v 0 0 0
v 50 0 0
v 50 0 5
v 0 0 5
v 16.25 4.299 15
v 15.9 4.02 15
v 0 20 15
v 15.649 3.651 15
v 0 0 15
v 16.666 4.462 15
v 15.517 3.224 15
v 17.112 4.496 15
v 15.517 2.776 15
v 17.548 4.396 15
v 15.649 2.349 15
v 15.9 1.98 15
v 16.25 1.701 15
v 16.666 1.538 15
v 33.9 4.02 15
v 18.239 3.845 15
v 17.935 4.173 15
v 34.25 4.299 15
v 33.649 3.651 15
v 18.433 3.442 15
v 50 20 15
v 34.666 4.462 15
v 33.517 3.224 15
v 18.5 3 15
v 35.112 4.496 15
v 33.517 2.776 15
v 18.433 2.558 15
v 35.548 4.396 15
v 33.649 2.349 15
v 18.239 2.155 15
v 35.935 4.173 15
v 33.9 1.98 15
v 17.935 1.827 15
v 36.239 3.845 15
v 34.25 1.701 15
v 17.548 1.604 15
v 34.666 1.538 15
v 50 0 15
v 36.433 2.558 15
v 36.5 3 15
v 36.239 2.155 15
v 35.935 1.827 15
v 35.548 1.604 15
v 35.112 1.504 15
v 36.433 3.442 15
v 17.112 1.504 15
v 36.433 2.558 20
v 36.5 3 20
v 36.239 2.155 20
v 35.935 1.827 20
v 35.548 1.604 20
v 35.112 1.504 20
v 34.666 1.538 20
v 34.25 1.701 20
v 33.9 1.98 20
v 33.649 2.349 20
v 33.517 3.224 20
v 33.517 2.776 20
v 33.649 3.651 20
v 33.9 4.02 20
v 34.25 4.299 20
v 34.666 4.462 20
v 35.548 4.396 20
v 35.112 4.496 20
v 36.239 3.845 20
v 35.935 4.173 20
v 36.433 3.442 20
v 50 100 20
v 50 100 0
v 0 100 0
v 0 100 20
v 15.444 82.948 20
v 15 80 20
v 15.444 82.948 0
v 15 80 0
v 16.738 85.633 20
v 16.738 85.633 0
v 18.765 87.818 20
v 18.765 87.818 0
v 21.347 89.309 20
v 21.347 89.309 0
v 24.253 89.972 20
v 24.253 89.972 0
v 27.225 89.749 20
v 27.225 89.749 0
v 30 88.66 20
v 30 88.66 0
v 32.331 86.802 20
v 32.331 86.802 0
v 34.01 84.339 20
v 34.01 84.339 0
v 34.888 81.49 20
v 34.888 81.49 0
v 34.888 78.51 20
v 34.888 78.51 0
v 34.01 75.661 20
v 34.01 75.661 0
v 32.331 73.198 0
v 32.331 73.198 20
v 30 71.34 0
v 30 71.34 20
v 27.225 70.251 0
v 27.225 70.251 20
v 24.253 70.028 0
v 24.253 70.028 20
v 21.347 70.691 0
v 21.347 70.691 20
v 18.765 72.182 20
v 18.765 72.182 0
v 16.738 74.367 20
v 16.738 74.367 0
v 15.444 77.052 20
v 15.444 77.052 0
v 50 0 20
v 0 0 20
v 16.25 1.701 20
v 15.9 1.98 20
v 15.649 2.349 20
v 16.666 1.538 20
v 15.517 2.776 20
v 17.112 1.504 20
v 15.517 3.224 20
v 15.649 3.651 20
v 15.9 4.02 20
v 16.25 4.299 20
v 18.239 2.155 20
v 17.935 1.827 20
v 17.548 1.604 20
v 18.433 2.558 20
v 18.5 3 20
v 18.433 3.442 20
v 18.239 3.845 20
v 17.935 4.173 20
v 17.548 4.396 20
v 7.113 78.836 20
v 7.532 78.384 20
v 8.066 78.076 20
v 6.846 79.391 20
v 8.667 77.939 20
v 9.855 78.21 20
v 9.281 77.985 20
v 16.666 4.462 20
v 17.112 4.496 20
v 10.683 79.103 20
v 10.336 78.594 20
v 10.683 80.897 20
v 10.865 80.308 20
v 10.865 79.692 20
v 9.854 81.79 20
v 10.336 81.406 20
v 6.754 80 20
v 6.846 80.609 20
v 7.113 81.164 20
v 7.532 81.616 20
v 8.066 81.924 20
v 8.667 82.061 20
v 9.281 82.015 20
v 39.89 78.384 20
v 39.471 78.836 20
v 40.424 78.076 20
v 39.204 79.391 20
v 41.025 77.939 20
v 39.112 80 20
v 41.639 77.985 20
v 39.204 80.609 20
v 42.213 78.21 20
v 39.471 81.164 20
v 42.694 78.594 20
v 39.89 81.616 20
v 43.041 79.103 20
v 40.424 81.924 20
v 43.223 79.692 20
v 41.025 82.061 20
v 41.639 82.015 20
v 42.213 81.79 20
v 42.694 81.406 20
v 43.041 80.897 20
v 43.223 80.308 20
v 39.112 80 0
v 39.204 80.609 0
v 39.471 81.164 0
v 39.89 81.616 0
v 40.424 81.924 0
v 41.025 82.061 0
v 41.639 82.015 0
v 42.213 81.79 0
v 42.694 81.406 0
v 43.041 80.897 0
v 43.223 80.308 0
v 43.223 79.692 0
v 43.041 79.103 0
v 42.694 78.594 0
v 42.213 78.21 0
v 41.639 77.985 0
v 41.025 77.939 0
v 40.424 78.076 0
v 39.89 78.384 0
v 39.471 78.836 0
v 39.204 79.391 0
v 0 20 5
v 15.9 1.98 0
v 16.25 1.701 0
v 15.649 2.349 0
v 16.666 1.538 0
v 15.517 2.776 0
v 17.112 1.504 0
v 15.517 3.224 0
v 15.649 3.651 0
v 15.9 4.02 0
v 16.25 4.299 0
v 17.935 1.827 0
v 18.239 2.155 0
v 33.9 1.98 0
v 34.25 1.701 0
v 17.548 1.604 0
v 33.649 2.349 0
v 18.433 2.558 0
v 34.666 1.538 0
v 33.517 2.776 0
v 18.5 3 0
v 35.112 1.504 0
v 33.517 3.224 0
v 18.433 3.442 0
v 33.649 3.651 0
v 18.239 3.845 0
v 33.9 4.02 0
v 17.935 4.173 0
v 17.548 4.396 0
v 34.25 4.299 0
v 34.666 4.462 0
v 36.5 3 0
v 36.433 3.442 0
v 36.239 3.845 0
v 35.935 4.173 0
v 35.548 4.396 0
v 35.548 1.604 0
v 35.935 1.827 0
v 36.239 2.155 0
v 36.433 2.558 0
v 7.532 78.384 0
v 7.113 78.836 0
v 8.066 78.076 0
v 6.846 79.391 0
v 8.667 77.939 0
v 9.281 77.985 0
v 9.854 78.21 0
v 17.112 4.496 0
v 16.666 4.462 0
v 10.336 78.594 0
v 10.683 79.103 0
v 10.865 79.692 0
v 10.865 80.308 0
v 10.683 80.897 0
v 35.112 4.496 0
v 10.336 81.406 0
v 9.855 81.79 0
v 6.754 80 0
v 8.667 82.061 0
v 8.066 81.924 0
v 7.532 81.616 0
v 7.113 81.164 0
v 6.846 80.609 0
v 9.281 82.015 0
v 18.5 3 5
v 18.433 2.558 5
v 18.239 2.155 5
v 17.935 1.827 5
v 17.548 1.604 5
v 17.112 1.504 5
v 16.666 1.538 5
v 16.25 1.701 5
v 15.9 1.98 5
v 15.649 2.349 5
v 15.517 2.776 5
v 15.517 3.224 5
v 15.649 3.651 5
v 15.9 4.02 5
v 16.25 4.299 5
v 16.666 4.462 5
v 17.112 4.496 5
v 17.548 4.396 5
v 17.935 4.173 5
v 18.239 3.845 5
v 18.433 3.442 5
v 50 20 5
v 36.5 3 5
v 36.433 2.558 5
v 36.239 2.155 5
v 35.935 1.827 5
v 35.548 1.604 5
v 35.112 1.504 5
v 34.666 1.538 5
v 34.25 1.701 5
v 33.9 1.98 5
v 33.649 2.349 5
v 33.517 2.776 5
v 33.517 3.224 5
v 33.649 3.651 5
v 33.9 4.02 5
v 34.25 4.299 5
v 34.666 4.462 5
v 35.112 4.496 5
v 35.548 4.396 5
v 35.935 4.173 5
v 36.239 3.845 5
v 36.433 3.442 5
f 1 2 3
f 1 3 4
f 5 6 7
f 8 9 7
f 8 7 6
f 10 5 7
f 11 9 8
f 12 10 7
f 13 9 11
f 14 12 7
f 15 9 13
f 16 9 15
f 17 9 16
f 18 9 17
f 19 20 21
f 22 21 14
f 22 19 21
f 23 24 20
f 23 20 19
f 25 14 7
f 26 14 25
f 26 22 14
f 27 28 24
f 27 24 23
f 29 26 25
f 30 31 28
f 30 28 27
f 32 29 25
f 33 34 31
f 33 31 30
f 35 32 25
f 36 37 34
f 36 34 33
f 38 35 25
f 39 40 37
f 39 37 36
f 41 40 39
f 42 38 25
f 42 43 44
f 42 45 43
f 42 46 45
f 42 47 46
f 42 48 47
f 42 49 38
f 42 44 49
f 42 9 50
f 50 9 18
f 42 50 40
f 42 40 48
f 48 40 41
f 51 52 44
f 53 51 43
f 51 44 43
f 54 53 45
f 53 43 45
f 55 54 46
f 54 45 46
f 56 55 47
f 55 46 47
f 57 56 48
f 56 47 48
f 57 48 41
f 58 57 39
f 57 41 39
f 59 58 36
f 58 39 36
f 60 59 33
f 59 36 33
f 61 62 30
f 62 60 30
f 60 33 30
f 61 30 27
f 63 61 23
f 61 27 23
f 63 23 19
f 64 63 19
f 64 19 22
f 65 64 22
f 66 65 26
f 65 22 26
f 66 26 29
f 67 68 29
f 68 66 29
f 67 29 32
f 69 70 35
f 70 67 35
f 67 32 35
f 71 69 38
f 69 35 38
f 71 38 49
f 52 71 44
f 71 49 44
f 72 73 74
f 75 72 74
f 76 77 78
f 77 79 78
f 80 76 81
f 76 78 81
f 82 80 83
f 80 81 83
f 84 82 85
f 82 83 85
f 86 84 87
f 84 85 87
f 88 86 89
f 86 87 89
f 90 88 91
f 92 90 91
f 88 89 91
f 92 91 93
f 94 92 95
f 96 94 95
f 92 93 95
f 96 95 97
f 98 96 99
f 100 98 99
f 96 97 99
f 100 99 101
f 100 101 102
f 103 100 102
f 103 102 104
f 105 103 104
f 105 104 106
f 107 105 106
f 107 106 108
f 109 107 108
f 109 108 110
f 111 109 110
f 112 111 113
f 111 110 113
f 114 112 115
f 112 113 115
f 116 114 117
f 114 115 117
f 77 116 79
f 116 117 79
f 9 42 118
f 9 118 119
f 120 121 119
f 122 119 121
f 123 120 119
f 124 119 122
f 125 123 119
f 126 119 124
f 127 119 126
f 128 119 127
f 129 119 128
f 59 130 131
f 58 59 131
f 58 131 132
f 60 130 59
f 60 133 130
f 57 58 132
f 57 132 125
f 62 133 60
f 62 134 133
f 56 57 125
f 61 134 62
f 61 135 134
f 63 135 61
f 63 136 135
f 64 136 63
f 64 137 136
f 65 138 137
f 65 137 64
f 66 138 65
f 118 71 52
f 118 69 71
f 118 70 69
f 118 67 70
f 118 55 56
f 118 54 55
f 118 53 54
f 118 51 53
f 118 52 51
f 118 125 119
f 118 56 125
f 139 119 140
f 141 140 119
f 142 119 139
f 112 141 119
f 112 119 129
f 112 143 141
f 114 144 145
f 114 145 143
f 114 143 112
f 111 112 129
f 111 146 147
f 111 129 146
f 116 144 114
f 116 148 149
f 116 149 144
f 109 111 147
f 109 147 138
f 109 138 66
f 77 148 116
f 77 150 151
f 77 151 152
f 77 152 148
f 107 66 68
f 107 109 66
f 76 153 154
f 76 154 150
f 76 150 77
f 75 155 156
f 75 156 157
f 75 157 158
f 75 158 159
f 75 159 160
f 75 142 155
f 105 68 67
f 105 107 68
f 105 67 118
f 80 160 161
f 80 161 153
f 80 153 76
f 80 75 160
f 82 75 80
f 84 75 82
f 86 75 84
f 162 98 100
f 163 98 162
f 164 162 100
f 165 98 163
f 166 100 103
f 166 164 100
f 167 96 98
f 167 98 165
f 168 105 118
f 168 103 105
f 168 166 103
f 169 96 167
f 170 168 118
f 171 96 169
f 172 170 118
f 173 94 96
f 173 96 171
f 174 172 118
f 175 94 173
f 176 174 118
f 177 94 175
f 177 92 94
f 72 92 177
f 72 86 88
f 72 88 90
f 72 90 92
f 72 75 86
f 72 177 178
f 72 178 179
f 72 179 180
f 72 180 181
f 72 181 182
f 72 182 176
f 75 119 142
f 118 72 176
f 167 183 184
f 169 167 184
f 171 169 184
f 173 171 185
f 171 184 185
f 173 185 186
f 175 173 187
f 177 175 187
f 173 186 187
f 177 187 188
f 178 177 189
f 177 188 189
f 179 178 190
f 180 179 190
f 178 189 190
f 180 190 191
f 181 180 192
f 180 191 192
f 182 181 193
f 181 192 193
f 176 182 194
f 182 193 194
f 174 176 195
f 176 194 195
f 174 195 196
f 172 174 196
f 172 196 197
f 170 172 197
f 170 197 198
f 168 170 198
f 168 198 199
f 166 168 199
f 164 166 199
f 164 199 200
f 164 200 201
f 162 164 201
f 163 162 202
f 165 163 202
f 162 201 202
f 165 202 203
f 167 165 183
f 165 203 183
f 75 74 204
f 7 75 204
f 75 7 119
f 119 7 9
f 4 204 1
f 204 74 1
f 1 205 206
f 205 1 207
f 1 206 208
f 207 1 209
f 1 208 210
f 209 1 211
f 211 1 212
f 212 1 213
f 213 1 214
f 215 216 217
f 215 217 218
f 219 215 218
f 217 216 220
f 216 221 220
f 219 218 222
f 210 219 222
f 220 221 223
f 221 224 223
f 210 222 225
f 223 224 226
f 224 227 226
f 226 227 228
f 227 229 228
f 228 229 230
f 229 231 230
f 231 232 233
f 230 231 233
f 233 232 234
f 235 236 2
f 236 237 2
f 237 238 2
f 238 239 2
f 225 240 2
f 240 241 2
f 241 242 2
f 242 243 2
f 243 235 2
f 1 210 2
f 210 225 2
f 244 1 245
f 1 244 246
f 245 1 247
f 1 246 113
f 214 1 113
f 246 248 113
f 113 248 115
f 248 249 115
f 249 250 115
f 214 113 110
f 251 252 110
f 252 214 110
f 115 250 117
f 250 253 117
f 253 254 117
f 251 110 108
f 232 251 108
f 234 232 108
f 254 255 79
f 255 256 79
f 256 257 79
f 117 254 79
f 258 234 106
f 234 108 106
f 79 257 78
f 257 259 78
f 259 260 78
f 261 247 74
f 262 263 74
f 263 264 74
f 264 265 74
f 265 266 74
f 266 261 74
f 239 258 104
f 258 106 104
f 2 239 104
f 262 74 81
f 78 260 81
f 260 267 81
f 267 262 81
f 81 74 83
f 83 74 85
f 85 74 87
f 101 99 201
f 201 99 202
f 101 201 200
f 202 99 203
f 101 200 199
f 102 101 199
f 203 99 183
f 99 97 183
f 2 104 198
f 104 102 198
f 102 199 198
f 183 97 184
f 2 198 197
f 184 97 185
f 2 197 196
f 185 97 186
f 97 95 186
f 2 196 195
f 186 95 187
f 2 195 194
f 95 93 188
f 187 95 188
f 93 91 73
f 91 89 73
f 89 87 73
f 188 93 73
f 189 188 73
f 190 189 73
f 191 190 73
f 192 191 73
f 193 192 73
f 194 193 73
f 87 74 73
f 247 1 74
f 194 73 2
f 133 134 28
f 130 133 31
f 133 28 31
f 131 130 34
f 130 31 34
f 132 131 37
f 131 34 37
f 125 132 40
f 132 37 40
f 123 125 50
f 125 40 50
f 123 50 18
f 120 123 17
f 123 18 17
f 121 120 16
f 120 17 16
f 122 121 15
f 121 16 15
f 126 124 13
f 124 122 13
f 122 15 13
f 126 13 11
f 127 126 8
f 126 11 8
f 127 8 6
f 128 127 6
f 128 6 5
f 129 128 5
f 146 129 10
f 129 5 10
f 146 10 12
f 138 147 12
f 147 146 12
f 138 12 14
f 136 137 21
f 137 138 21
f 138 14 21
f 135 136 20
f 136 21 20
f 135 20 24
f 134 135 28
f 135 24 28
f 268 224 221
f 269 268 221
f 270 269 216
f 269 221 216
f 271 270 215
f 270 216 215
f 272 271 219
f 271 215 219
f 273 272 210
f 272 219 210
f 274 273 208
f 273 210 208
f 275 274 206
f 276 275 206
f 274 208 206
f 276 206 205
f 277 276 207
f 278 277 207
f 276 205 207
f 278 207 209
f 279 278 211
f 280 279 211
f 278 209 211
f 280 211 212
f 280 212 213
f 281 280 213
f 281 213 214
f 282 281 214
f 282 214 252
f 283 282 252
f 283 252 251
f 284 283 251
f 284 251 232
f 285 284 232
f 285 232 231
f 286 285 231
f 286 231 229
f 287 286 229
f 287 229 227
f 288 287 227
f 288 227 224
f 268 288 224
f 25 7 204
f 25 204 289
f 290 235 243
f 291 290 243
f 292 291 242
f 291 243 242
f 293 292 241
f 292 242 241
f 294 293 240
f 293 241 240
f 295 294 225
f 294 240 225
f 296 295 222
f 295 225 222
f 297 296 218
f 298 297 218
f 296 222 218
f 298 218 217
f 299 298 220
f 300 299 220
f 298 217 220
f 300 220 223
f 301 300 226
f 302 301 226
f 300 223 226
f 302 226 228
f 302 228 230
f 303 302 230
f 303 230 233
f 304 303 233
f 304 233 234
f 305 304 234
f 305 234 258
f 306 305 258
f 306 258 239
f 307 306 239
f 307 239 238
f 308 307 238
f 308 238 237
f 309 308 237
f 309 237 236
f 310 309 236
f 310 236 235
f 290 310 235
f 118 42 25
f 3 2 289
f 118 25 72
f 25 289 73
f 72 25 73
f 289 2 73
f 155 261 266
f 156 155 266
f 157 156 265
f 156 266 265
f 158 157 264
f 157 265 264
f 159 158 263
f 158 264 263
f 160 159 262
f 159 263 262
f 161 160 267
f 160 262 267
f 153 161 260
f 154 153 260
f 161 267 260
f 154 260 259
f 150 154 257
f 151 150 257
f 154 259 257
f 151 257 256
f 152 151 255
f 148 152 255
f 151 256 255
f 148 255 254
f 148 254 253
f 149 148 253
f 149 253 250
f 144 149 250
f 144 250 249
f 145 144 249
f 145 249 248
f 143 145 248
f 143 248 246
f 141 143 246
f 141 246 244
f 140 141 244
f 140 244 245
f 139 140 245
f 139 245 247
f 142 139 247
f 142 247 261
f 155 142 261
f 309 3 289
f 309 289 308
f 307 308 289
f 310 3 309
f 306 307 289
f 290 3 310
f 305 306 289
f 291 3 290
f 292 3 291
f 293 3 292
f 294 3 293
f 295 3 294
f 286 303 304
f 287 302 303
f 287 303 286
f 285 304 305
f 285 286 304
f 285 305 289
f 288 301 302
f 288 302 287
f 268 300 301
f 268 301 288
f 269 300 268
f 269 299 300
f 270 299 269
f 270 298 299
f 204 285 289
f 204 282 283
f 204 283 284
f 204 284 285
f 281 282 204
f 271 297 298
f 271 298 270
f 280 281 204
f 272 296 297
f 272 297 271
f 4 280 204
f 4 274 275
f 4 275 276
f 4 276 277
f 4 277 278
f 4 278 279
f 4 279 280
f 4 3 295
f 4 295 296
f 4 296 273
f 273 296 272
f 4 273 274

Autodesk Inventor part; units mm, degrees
ref_plane "YZ Plane" through (0, 0, 0) normal (1, 0, 0) x (0, 1, 0)
ref_plane "XZ Plane" through (0, 0, 0) normal (0, 1, 0) x (-1, 0, 0)
ref_plane "XY Plane" through (0, 0, 0) normal (0, 0, 1) x (1, 0, 0)
sketch "草圖1" plane through (0, 0, 0) normal (0, 0, 1) x (1, 0, 0)
  line L0 (50, 0) -> (50, 100)
  line L1 (50, 100) -> (0, 100)
  line L2 (0, 100) -> (0, 0)
  line L3 (50, 0) -> (33, 0)
  line L4 (33, 0) -> (24.5, 0)
  circle A0 centre (17, 3) radius 1.5
  circle A1 centre (35, 3) radius 1.5
  line L5 (0, 0) -> (50, 0)
  dimension "d0" = 50
  dimension "d4" = 3
  dimension "d5" = 100
  dimension "d7" = 3
  dimension "d22" = 18
  dimension "d23" = 3
  dimension "d24" = 15
extrude "擠出1" add sketch "草圖1" along normal blind 20
sketch "草圖2" plane through (0, 0, 0) normal (0, -1, 0) x (1, 0, 0)
  line L0 (0, 20) -> (50, 20) projected
  line L1 (0, 0) -> (50, 0) projected
  line L2 (0, 0) -> (0, 20) projected
  line L3 (50, 0) -> (50, 20) projected
  line L4 (50, 5) -> (0, 5)
  line L5 (0, 5) -> (0, 15)
  line L6 (0, 15) -> (50, 15)
  line L7 (50, 15) -> (50, 5)
  point P0 (15, 22.5)
  point P1 (0, 5)
  dimension "d13" = 0
  dimension "d14" = 0
  dimension "d15" = 5
  dimension "d16" = 10
extrude "擠出2" cut sketch "草圖2" against normal blind 20 contours L6 L3 L4 L2
sketch "草圖3" plane through (0, 0, 0) normal (0, 0, -1) x (-1, 0, 0)
  circle A0 centre (-25, 80) radius 10
  line L0 (-50, 100) -> (0, 100) projected
  line L1 (0, 100) -> (0, 0) projected
  circle A1 centre (-8.821, 80) radius 2.067
  circle A2 centre (-41.179, 80) radius 2.067
  line L2 (-25, 80) -> (-8.821, 80)
  line L3 (-25, 80) -> (-41.179, 80)
  dimension "d17" = 20
  dimension "d18" = 20
  dimension "d19" = 25
  dimension "d27" = 4.134
  dimension "d29" = 4.134
  dimension "d30" = 16.179
  dimension "d31" = 16.179
  dimension "d32" = 0
  dimension "d33" = 0
  dimension "d34" = 0
  dimension "d35" = 0
extrude "擠出3" cut sketch "草圖3" against normal blind 20
properties part number "汽缸"
